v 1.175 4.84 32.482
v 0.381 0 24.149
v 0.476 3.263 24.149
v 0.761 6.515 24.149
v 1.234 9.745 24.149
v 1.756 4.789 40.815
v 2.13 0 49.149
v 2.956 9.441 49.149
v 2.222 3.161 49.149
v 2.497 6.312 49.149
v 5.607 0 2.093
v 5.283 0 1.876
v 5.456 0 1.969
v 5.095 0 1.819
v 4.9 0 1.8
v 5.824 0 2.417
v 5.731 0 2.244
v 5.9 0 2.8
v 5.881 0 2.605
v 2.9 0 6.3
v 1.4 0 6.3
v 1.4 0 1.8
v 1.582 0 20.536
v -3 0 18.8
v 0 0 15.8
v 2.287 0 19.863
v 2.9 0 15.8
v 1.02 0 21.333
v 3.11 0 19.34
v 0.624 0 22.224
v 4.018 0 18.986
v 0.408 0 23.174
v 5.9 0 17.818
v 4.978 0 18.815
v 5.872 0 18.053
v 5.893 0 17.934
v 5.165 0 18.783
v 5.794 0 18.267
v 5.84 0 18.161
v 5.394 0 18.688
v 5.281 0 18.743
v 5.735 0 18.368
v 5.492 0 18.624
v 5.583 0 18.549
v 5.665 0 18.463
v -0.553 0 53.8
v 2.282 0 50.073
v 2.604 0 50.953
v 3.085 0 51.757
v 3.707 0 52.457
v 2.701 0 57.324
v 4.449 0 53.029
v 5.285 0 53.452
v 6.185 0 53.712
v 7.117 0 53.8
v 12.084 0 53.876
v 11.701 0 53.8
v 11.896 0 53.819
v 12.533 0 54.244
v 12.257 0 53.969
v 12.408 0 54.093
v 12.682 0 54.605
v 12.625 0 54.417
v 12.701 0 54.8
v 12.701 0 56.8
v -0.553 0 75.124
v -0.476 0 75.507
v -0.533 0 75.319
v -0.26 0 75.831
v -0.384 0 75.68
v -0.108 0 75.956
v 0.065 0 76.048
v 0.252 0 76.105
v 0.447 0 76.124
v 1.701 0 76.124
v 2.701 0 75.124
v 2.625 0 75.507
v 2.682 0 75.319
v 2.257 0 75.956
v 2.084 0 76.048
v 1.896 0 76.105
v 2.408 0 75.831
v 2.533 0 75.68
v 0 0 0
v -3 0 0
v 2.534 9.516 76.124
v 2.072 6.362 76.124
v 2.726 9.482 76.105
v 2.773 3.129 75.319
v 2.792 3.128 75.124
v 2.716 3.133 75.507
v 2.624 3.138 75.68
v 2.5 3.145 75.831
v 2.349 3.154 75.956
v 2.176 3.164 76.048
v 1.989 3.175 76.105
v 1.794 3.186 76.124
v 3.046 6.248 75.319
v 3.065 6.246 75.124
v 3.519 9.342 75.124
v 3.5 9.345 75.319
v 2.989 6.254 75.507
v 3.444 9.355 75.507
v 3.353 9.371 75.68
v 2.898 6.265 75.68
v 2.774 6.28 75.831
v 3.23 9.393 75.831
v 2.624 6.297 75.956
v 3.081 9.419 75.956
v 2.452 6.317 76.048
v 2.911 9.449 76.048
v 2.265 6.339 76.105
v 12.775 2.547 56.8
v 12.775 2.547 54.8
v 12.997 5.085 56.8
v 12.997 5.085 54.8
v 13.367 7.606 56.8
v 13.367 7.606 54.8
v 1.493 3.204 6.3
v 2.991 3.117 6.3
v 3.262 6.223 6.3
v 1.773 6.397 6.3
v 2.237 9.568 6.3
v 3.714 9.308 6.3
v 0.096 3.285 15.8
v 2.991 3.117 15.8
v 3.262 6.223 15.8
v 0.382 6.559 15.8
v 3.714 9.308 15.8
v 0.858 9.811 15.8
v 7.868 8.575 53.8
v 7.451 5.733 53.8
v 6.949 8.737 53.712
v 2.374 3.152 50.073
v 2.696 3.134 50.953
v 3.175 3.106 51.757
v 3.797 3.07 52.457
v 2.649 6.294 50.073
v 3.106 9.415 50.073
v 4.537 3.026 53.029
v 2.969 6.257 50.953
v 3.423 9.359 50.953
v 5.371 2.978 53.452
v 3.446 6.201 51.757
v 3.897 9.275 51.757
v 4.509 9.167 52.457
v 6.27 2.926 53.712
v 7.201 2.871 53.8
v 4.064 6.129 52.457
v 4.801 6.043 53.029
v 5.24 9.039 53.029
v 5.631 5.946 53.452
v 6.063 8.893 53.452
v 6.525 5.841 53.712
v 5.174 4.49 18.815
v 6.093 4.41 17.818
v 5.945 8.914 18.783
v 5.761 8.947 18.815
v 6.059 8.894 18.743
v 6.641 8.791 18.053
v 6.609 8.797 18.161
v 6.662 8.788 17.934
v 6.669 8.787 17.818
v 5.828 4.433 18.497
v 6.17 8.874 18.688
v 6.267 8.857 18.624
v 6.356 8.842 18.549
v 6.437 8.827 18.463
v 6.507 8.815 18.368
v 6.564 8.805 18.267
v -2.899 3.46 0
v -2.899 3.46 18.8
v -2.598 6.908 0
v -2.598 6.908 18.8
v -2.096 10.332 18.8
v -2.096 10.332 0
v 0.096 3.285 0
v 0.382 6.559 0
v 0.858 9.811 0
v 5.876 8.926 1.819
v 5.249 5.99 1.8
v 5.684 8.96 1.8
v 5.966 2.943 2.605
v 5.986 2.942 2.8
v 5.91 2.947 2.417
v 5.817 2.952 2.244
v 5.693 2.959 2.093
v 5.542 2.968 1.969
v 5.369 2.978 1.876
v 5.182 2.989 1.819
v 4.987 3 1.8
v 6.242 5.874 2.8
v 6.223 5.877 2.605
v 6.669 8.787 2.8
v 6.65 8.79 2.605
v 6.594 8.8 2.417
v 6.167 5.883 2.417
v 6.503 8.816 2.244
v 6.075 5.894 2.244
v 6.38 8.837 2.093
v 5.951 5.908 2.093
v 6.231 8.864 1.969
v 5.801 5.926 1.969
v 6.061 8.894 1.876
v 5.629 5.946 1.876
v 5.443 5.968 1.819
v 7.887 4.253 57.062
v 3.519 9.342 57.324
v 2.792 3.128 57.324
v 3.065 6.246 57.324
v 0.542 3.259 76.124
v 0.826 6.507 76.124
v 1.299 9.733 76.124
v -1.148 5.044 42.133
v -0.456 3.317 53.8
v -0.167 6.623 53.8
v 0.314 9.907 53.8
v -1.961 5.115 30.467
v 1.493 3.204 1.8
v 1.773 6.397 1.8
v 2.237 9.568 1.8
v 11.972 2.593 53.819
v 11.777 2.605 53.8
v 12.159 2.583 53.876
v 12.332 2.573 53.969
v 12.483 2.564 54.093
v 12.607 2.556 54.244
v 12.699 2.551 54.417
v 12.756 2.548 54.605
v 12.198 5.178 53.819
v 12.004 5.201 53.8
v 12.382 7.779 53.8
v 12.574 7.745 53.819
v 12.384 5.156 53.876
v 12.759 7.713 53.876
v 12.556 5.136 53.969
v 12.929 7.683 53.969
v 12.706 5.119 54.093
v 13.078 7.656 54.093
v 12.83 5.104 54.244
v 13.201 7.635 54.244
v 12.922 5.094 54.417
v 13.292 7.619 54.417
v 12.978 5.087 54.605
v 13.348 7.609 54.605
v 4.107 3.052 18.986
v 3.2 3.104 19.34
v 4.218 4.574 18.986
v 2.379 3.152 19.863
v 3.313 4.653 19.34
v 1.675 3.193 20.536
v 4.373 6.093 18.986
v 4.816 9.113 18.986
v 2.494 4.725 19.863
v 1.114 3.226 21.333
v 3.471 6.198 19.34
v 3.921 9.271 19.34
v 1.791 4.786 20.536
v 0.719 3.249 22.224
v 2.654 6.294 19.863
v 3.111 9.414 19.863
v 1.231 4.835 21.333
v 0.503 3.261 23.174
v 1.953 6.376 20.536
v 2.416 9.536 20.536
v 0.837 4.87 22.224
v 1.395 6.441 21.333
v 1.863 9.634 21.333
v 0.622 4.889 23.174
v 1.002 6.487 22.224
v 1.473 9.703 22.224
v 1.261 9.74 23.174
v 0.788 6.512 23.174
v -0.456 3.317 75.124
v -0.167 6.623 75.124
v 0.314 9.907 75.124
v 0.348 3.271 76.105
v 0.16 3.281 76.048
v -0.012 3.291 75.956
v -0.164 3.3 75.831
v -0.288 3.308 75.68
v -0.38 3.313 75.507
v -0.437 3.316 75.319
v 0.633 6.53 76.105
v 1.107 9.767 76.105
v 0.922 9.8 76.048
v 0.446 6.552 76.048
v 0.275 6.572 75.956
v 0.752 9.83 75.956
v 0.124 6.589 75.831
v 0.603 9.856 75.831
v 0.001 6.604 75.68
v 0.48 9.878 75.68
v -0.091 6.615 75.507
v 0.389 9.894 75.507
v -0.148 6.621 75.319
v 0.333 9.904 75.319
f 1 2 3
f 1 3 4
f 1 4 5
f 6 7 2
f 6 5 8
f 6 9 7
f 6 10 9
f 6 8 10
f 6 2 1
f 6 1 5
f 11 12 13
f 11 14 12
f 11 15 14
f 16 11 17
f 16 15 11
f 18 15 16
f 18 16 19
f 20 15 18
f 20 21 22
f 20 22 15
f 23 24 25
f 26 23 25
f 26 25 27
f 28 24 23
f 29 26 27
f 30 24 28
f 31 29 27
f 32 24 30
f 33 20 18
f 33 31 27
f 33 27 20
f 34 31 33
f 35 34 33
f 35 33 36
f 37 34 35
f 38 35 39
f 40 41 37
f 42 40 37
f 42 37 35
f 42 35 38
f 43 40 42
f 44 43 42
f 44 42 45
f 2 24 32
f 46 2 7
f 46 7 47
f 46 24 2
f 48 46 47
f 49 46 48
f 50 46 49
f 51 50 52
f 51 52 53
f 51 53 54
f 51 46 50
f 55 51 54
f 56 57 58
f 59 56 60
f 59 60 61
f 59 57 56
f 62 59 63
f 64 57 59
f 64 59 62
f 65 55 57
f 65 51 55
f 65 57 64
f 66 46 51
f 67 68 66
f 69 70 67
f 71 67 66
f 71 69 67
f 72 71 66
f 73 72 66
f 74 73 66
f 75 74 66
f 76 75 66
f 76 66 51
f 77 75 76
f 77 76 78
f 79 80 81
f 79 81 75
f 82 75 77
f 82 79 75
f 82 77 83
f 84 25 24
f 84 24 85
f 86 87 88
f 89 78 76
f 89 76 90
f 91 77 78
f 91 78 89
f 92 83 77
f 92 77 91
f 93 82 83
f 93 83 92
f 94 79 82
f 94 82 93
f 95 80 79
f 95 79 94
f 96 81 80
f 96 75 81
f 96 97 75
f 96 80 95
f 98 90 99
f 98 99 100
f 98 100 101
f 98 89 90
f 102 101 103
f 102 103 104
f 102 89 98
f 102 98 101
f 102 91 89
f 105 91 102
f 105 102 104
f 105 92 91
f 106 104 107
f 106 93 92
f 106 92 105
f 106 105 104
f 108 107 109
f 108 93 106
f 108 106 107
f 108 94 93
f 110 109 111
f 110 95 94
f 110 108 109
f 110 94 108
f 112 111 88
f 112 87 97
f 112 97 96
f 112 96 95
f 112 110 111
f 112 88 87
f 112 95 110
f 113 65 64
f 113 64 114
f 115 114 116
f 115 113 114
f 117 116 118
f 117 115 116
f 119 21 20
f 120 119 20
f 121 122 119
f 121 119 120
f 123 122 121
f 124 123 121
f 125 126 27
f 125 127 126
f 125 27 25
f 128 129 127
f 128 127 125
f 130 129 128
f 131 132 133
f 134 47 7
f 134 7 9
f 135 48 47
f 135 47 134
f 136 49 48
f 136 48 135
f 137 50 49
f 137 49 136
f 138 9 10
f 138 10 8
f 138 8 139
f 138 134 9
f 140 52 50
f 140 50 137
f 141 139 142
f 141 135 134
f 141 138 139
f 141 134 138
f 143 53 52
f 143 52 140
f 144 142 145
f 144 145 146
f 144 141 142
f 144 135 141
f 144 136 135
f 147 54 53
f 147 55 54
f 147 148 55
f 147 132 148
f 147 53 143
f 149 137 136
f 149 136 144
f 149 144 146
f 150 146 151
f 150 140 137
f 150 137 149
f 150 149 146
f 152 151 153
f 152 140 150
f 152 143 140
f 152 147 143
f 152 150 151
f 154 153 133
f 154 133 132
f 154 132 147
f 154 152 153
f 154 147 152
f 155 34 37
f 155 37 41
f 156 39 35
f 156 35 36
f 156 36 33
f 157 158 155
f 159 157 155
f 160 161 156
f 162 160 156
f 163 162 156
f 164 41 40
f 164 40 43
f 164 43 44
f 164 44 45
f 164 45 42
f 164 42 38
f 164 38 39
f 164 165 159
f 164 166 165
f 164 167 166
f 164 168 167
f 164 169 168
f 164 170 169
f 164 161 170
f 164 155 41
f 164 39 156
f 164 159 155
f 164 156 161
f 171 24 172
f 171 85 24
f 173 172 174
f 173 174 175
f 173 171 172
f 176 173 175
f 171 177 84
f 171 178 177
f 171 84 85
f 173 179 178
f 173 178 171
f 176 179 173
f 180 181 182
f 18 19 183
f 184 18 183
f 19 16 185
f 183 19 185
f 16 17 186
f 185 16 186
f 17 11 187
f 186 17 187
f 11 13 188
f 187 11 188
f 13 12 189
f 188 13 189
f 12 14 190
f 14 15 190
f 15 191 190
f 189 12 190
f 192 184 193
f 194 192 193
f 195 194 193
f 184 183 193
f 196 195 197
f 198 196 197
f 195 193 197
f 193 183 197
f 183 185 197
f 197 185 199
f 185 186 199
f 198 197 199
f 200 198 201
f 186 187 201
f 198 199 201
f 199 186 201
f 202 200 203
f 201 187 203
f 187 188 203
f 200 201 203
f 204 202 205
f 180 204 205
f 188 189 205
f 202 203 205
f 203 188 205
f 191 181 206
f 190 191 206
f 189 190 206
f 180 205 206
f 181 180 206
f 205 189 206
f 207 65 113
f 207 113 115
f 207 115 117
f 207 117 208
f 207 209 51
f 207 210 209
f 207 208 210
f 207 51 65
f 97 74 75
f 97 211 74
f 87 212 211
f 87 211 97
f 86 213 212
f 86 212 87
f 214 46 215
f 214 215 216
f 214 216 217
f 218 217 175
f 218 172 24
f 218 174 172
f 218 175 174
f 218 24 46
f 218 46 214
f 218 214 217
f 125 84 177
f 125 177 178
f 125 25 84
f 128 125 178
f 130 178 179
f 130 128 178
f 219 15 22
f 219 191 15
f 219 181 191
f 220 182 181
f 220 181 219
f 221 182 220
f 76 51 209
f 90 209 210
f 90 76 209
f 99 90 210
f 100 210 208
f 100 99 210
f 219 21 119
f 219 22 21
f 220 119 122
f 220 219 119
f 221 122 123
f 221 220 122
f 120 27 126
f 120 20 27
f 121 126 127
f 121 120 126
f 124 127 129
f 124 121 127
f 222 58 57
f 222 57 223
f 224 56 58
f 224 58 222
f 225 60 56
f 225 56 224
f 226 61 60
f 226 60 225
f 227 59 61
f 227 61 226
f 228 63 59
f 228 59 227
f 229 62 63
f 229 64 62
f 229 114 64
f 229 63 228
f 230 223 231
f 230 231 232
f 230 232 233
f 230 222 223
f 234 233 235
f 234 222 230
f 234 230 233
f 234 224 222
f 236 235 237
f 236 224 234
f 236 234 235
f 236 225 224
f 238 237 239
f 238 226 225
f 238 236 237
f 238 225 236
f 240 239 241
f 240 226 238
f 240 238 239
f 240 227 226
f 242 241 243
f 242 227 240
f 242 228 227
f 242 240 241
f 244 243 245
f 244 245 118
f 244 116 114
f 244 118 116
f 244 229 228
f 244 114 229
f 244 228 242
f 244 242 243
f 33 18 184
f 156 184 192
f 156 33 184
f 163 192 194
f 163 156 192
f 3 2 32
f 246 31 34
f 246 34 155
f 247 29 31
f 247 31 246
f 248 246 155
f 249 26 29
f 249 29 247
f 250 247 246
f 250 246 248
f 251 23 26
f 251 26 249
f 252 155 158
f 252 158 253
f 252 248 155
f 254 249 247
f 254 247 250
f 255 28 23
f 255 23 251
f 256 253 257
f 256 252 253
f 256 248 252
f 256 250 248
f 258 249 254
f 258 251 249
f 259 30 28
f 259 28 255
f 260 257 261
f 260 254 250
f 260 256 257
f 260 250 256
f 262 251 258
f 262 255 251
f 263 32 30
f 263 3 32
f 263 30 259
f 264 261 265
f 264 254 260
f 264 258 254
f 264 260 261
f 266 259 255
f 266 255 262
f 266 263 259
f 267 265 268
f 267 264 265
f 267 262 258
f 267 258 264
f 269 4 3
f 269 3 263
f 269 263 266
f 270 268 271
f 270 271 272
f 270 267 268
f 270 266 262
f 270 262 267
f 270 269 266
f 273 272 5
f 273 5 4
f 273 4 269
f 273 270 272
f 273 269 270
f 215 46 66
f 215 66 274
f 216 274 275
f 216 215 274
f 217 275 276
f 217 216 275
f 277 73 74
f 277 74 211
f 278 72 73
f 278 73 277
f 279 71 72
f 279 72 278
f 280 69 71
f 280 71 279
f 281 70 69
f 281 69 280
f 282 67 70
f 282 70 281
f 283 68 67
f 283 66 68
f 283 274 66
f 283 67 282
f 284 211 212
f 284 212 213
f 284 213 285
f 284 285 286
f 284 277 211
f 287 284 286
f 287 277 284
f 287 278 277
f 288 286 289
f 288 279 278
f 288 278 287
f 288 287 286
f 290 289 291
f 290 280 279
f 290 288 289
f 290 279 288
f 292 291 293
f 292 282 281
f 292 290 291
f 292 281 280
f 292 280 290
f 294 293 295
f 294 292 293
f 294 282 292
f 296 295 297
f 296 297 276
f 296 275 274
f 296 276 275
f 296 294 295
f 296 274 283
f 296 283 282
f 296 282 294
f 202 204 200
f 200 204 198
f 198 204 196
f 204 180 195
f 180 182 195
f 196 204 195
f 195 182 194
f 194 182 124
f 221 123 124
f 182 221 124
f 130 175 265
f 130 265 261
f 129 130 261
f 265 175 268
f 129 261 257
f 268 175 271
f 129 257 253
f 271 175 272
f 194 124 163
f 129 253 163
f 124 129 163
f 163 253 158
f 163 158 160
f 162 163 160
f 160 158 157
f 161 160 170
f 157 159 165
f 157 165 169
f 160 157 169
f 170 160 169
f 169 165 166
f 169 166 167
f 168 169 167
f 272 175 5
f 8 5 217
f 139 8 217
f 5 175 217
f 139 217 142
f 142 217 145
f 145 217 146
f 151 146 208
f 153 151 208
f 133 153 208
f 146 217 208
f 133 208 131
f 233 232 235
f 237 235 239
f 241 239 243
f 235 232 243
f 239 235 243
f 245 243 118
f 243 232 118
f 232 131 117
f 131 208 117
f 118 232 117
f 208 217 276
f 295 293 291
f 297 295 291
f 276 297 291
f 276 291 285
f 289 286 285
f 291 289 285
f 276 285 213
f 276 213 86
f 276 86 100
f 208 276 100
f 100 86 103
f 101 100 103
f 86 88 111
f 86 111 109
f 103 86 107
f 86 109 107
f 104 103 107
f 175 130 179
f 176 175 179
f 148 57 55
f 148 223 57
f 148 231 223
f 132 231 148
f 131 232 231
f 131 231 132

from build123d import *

# Parameters (mm, degrees)
F1_ANGLE = 10
F2_R     = 5
F3_R     = 1


# Not quite as in the source:
# - a feature names something its author has since deleted; it is built from what else it names


with BuildPart() as f1:
    # F0 (on Front) → F1 (revolve)
    with BuildSketch(Plane.XZ):
        Polygon((-3, 0), (0, 0), (0, 15.8), (2.9, 15.8), (2.9, 6.3), (1.4, 6.3), (1.4, 1.8), (5.9, 1.8), (5.9, 18.8), (0.0073256942, 18.8), (-3, 18.8), align=None)
        Polygon((-0.552561582, 53.8), (-3, 18.8), (0.0073256942, 18.8), (2.4547641123, 53.8), align=None)
        Polygon((-0.552561582, 76.1240777928), (-0.552561582, 53.8), (2.4547641123, 53.8), (12.7011916374, 53.8), (12.7011916374, 56.8), (2.7011916374, 57.3240777928), (2.7011916374, 76.1240777928), align=None)
    revolve(axis=Axis((56.5, 0, 26.2500001118), (0, 0, -1)), revolution_arc=F1_ANGLE)

    # F2
    f2_edges = [f1.edges().sort_by_distance(p)[0] for p in [
        (0.222297, 4.923661, 18.8),
        (2.660423, 4.710353, 53.8),
    ]]
    fillet(f2_edges, radius=F2_R)

    # F3
    f3_edges = [f1.edges().sort_by_distance(p)[0] for p in [
        (6.092548, 4.410081, 1.8),
        (6.092548, 4.410081, 18.8),
        (12.867859, 3.817318, 53.8),
        (2.905912, 4.688875, 76.124078),
        (-0.335459, 4.972458, 76.124078),
    ]]
    fillet(f3_edges, radius=F3_R)


solid = f1.part
